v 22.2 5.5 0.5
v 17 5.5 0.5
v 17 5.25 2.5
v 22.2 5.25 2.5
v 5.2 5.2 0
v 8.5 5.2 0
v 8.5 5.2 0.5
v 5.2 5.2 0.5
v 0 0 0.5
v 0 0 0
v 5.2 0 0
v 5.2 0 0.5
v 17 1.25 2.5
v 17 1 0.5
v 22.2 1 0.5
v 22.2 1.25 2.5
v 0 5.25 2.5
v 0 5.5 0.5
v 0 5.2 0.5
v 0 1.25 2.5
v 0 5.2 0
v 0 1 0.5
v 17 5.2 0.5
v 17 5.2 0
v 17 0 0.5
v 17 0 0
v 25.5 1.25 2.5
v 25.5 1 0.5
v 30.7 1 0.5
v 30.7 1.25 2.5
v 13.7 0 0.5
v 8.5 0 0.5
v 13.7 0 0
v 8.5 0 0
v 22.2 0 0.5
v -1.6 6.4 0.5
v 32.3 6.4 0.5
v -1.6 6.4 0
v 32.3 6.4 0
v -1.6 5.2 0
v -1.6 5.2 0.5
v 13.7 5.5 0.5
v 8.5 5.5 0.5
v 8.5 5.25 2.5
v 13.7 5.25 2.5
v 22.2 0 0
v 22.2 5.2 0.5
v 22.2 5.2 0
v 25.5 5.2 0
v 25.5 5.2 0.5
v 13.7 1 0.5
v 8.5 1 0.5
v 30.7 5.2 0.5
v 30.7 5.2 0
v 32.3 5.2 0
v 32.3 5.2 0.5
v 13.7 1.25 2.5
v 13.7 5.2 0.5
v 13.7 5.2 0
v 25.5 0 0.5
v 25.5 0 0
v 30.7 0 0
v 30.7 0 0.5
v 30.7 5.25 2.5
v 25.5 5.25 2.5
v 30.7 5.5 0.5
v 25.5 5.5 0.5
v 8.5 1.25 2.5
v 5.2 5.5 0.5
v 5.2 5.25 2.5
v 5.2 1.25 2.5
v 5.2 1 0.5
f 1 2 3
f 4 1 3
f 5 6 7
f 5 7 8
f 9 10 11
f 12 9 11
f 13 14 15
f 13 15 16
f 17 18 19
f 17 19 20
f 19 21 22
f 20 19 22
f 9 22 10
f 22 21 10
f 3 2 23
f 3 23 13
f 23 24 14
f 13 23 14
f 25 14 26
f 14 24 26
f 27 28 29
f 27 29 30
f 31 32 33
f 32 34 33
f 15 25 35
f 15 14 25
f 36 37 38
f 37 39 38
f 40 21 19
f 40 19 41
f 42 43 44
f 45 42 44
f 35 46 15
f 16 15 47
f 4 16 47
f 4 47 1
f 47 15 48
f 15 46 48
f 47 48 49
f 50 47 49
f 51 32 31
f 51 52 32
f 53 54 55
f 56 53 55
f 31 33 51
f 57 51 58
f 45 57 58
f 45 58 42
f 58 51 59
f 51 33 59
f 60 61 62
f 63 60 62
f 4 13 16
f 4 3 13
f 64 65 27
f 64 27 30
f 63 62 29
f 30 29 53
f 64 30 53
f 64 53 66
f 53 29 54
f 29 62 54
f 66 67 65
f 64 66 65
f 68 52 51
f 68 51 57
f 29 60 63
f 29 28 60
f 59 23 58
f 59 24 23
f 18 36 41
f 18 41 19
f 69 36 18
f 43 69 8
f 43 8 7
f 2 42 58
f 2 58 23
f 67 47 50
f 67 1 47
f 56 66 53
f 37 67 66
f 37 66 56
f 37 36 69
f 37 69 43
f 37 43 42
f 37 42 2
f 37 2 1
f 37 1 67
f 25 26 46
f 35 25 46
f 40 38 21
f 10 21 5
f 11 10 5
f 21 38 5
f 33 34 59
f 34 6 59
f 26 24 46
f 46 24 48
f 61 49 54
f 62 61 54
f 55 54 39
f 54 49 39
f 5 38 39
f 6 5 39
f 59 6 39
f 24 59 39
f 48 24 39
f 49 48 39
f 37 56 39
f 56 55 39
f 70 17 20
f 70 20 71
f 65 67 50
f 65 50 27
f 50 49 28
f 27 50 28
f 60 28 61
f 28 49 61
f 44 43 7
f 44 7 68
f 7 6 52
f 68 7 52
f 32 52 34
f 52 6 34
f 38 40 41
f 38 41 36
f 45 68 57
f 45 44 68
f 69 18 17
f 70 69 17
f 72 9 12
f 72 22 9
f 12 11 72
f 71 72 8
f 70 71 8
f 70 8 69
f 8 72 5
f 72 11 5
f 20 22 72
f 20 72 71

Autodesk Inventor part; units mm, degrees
ref_plane "YZ Plane" through (0, 0, 0) normal (1, 0, 0) x (0, 1, 0)
ref_plane "XZ Plane" through (0, 0, 0) normal (0, 1, 0) x (-1, 0, 0)
ref_plane "XY Plane" through (0, 0, 0) normal (0, 0, 1) x (1, 0, 0)
sketch "Эскиз1" plane through (0, 0, 0) normal (0, 0, 1) x (1, 0, 0)
  line L0 (0, 0) -> (5.2, 0)
  line L1 (5.2, 0) -> (5.2, 6.4)
  line L2 (5.2, 6.4) -> (0, 6.4)
  line L3 (0, 6.4) -> (0, 0)
  line L4 (8.5, 0) -> (13.7, 0)
  line L5 (13.7, 0) -> (13.7, 6.4)
  line L6 (13.7, 6.4) -> (8.5, 6.4)
  line L7 (8.5, 6.4) -> (8.5, 0)
  line L8 (17, 0) -> (22.2, 0)
  line L9 (22.2, 0) -> (22.2, 6.4)
  line L10 (22.2, 6.4) -> (17, 6.4)
  line L11 (17, 6.4) -> (17, 0)
  line L12 (25.5, 0) -> (30.7, 0)
  line L13 (30.7, 0) -> (30.7, 6.4)
  line L14 (30.7, 6.4) -> (25.5, 6.4)
  line L15 (25.5, 6.4) -> (25.5, 0)
  line L16 (5.2, 6.4) -> (8.5, 6.4)
  line L17 (13.7, 6.4) -> (17, 6.4)
  line L18 (22.2, 6.4) -> (25.5, 6.4)
  line L19 (22.2, 5.2) -> (25.5, 5.2)
  line L20 (17, 5.2) -> (13.7, 5.2)
  line L21 (8.5, 5.2) -> (5.2, 5.2)
  line L22 (0, 5.2) -> (-1.6, 5.2)
  line L23 (-1.6, 5.2) -> (-1.6, 6.4)
  line L24 (-1.6, 6.4) -> (0, 6.4)
  line L25 (0, 6.4) -> (0, 5.2)
  line L26 (30.7, 5.2) -> (32.3, 5.2)
  line L27 (32.3, 5.2) -> (32.3, 6.4)
  line L28 (32.3, 6.4) -> (30.7, 6.4)
  line L29 (30.7, 6.4) -> (30.7, 5.2)
  point P0 (0, 6.4)
  dimension "d0" = 5.2
  dimension "d1" = 6.4
  dimension "d4" = 8.5
  dimension "d9" = 1.2
  dimension "d10" = 1.6
extrude "Выдавливание1" add sketch "Эскиз1" along normal blind 0.5
sketch "Эскиз2" plane through (0, 0, 0.5) normal (0, 0, 1) x (1, 0, 0)
  line L0 (0, 5.2) -> (0, 0) projected
  line L1 (5.2, 0) -> (5.2, 5.2) projected
  line L2 (0, 1) -> (5.2, 1)
  line L3 (5.2, 1) -> (5.2, 5.5)
  line L4 (5.2, 5.5) -> (0, 5.5)
  line L5 (0, 5.5) -> (0, 1)
  line L6 (8.5, 5.2) -> (8.5, 0) projected
  line L7 (13.7, 0) -> (13.7, 5.2) projected
  line L8 (8.5, 1) -> (13.7, 1)
  line L9 (13.7, 1) -> (13.7, 5.5)
  line L10 (13.7, 5.5) -> (8.5, 5.5)
  line L11 (8.5, 5.5) -> (8.5, 1)
  line L12 (17, 5.2) -> (17, 0) projected
  line L13 (22.2, 0) -> (22.2, 5.2) projected
  line L14 (17, 1) -> (22.2, 1)
  line L15 (22.2, 1) -> (22.2, 5.5)
  line L16 (22.2, 5.5) -> (17, 5.5)
  line L17 (17, 5.5) -> (17, 1)
  line L18 (25.5, 5.2) -> (25.5, 0) projected
  line L19 (30.7, 0) -> (30.7, 5.2) projected
  line L20 (25.5, 1) -> (30.7, 1)
  line L21 (30.7, 1) -> (30.7, 5.5)
  line L22 (30.7, 5.5) -> (25.5, 5.5)
  line L23 (25.5, 5.5) -> (25.5, 1)
  line L24 (0, 0) -> (5.2, 0) projected
  point P0 (25.5, 5)
  point P1 (17, 5)
  point P2 (8.5, 5)
  point P3 (0, 5)
  dimension "d13" = 1
  dimension "d14" = 4.5
extrude "Выдавливание2" add sketch "Эскиз2" along normal blind 2 contours L5 L4 L3 L1 L2 L0 | L11 L10 L9 L7 L8 L6 | L17 L16 L15 L13 L14 L12 | L23 L22 L21 L19 L20 L18
sketch "Эскиз3" plane through (0, 0, 0) normal (-1, 0, 0) x (0, 0, 1)
  line L0 (0.5, 1) -> (2.5, 1.25)
  line L1 (0, 5.2) -> (0, 0) projected
  line L2 (0, 0) -> (0.5, 0) projected
  line L3 (0.5, 1) -> (0.5, 0) projected
  line L4 (0.5, 1) -> (2.5, 1) projected
  line L5 (2.5, 5.5) -> (2.5, 1) projected
  line L6 (0.5, 5.2) -> (0.5, 5.5) projected
  line L7 (0, 5.2) -> (0.5, 5.2) projected
  line L8 (0.5, 1) -> (2.5, 1)
  line L9 (0.5, 5.5) -> (2.5, 5.5)
  line L10 (0.5, 5.5) -> (2.5, 5.25)
  line L11 (2.5, 1) -> (2.5, 5.5) projected
  line L12 (2.5, 1.25) -> (2.5, 1)
  line L13 (0.5, 5.5) -> (2.5, 5.5) projected
  line L14 (0.5, 6.4) -> (0.5, 5.2) projected
  line L15 (2.5, 5.5) -> (2.5, 1) projected
  line L16 (2.5, 5.25) -> (2.5, 5.5)
  point P0 (2, 5.8)
  point P1 (2, 5.6739)
  point P2 (2, 5.8)
  dimension "d18" = 4
extrude "Выдавливание3" cut sketch "Эскиз3" against normal through all contours L0 L5 L4 | L10 L9 L5
properties part number "Buttons"
